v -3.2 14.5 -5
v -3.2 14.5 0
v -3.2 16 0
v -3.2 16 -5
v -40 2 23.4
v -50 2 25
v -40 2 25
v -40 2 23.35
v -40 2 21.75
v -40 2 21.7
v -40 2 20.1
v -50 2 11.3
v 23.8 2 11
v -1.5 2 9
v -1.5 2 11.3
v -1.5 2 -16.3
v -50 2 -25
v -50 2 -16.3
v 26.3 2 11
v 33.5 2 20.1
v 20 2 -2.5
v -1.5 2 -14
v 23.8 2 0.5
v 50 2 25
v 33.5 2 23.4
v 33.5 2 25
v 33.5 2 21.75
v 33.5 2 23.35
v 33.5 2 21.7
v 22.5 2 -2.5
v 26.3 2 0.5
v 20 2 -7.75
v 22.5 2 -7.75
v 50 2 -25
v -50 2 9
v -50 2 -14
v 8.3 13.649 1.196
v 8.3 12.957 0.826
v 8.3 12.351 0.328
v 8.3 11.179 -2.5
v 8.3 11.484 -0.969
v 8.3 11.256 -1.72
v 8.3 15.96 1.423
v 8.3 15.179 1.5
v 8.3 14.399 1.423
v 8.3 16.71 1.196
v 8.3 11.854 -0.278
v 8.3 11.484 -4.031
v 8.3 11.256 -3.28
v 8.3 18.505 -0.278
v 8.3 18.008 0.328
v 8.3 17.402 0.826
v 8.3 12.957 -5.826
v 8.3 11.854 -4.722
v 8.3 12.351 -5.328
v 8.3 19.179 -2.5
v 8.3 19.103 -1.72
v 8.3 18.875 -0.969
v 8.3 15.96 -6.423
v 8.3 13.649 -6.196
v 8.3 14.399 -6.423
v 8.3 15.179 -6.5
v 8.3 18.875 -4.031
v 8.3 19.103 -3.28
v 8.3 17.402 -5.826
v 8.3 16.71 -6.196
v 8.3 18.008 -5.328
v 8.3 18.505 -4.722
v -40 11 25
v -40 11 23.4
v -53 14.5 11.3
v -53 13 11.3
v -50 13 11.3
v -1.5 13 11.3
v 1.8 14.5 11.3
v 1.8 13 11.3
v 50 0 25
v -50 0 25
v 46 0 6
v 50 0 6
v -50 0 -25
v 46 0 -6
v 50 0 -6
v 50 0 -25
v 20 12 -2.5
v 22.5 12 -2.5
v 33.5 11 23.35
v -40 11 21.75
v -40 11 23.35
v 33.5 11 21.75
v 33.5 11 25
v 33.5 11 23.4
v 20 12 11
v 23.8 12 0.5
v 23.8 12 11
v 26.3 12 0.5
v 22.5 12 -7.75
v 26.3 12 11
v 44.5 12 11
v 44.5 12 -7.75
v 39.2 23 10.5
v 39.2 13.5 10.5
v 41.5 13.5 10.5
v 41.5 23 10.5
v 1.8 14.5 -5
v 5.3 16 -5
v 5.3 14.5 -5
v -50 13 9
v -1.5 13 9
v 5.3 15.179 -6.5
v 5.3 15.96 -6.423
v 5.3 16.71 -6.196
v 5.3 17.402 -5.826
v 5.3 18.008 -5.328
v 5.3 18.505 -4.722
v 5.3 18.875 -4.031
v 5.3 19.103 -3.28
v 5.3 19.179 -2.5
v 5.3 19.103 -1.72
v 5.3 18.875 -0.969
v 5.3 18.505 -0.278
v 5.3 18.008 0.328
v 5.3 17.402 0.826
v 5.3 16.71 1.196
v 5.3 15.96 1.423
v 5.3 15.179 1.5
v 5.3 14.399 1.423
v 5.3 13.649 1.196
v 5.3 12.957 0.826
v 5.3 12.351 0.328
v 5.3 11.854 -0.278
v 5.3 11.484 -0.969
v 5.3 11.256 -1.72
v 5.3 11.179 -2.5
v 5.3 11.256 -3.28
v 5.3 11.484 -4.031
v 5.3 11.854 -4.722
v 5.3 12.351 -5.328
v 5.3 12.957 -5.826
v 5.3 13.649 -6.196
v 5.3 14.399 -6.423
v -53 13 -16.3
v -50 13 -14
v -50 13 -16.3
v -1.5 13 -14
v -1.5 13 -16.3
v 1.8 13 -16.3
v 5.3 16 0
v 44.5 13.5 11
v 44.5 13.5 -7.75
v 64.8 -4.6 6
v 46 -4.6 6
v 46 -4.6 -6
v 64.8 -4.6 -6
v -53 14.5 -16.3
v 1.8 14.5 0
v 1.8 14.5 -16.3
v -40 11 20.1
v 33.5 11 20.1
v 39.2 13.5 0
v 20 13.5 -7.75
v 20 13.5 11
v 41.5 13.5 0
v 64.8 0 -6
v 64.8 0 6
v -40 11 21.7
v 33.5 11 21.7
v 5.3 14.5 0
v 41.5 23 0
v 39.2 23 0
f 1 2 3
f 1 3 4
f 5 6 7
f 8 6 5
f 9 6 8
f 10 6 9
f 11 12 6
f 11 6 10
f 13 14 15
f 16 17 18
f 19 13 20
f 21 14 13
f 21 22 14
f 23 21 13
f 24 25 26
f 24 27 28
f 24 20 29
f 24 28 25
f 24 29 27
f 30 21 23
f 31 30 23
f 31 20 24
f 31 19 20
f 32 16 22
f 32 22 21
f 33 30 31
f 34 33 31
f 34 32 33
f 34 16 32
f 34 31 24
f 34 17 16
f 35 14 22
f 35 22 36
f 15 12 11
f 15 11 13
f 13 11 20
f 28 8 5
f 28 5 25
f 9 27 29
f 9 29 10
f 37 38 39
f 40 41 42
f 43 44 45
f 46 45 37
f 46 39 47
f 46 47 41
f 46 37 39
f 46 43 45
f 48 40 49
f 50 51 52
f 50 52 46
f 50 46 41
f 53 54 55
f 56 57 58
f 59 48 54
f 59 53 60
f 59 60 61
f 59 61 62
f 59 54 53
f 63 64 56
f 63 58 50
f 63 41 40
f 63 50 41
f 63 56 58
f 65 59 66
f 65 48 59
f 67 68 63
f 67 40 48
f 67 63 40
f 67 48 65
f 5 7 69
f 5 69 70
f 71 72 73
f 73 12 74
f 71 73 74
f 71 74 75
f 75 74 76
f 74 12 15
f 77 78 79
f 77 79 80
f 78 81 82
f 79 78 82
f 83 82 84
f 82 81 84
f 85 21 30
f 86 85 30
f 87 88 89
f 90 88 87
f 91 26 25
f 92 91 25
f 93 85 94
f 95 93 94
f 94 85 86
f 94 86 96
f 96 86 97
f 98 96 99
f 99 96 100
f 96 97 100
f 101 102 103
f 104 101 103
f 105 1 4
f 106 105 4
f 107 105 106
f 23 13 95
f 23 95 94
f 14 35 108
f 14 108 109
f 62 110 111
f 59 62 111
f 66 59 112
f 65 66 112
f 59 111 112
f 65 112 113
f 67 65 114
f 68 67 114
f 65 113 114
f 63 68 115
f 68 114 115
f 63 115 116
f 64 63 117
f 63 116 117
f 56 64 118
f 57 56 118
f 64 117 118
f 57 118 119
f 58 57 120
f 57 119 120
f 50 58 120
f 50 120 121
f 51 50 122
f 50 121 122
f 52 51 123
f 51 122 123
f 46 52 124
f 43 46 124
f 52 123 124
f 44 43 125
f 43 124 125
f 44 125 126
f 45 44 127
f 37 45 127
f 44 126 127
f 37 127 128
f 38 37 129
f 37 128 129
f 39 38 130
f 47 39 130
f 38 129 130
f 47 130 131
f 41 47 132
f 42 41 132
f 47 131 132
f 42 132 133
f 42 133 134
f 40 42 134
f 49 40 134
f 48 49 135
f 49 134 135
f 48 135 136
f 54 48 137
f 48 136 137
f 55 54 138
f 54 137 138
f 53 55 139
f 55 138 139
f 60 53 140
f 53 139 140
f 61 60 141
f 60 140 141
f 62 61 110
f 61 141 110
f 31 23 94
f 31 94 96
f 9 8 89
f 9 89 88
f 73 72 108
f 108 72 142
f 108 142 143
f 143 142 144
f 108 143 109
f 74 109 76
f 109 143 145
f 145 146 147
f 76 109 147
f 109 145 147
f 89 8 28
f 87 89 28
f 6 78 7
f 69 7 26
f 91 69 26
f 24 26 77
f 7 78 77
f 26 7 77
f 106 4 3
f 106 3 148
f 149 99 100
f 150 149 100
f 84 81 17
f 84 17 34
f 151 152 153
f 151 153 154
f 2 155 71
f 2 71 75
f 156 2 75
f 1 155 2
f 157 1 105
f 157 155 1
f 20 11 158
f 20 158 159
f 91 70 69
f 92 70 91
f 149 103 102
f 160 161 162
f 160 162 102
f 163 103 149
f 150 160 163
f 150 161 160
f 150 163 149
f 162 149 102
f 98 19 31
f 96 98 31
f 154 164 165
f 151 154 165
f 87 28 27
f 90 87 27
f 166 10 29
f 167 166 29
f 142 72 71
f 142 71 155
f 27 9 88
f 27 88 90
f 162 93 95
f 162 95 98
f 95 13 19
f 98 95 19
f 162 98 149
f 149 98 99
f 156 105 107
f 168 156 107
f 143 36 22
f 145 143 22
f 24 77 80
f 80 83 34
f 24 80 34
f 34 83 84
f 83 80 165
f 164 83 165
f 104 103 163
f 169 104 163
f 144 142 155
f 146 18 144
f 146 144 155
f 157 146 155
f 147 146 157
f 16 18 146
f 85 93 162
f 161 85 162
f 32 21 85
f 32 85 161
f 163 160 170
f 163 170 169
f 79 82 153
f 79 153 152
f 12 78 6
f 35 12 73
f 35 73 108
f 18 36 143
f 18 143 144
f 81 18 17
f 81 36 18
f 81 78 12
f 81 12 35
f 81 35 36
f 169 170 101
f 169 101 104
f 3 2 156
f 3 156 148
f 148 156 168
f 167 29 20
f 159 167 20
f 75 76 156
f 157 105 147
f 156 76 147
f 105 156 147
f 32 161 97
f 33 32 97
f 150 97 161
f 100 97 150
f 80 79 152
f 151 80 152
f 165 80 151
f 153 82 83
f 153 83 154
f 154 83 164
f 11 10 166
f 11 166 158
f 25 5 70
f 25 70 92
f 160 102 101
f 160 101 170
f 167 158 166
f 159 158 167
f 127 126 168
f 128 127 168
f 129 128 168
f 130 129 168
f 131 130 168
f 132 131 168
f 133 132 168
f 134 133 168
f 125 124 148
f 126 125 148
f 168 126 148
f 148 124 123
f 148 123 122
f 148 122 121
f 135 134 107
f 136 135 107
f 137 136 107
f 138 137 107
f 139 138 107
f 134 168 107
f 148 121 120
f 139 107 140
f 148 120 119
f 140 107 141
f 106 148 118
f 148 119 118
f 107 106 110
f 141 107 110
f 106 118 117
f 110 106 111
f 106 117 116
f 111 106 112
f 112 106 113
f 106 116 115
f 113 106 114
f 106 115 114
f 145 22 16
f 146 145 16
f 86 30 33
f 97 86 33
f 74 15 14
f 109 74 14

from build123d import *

# Parameters (mm, degrees)
SKETCH1_W            = 100
SKETCH1_H            = 50
BOSS_EXTRUDE1_DEPTH  = 2
SKETCH2_W            = 73.5
SKETCH2_H            = 1.6
BOSS_EXTRUDE2_DEPTH  = 9
LPATTERN2_COUNT      = 3
LPATTERN2_PITCH      = 1.65
SKETCH3_W            = 18.8
SKETCH3_H            = 12
BOSS_EXTRUDE3_DEPTH  = 4.6
SKETCH4_W            = 48.5
SKETCH4_H            = 2.3
BOSS_EXTRUDE4_DEPTH  = 11
SKETCH5_W            = 54.8
SKETCH5_H            = 27.6
BOSS_EXTRUDE5_DEPTH  = 1.5
SKETCH6_W            = 8.5
SKETCH6_H            = 5
BOSS_EXTRUDE6_DEPTH  = 1.5
SKETCH7_R            = 4
BOSS_EXTRUDE7_DEPTH  = 3
SKETCH8_W            = 2.5
SKETCH8_H            = 10.5
SKETCH8_H_2          = 5.25
BOSS_EXTRUDE8_DEPTH  = 10
SKETCH9_W            = 24.5
SKETCH9_H            = 18.75
BOSS_EXTRUDE9_DEPTH  = 1.5
SKETCH10_W           = 2.3
SKETCH10_H           = 10.5
BOSS_EXTRUDE10_DEPTH = 9.5


with BuildPart() as part:
    # Sketch1 → Boss-Extrude1 (new body)
    with BuildSketch(Plane(origin=(0, 0, 0), x_dir=(1, 0, 0), z_dir=(0, 1, 0))):
        Rectangle(SKETCH1_W, SKETCH1_H)
    extrude(amount=BOSS_EXTRUDE1_DEPTH)

    # Sketch2 → Boss-Extrude2 (add)
    with BuildSketch(Plane(origin=(0, 2, 0), x_dir=(1, 0, 0), z_dir=(0, 1, 0))):
        with Locations((-3.25, -24.2)):
            Rectangle(SKETCH2_W, SKETCH2_H)
    boss_extrude2 = extrude(amount=BOSS_EXTRUDE2_DEPTH)

    # LPattern2: Boss-Extrude2 ×3
    with Locations(*[(0, 0, -i * LPATTERN2_PITCH) for i in range(1, LPATTERN2_COUNT)]):
        add(boss_extrude2)

    # Sketch3 → Boss-Extrude3 (add)
    with BuildSketch(Plane.XZ):
        with Locations((55.4, 0)):
            Rectangle(SKETCH3_W, SKETCH3_H)
    extrude(amount=BOSS_EXTRUDE3_DEPTH)

    # Sketch4 → Boss-Extrude4 (add)
    with BuildSketch(Plane(origin=(0, 2, 0), x_dir=(1, 0, 0), z_dir=(0, 1, 0))):
        with Locations((-25.75, -10.15)):
            Rectangle(SKETCH4_W, SKETCH4_H)
        with Locations((-25.75, 15.15)):
            Rectangle(SKETCH4_W, SKETCH4_H)
    extrude(amount=BOSS_EXTRUDE4_DEPTH)

    # Sketch5 → Boss-Extrude5 (add)
    with BuildSketch(Plane(origin=(0, 13, 0), x_dir=(1, 0, 0), z_dir=(0, 1, 0))):
        with Locations((-25.6, 2.5)):
            Rectangle(SKETCH5_W, SKETCH5_H)
    extrude(amount=BOSS_EXTRUDE5_DEPTH)

    # Sketch6 → Boss-Extrude6 (add)
    with BuildSketch(Plane(origin=(0, 14.5, 0), x_dir=(1, 0, 0), z_dir=(0, 1, 0))):
        with Locations((1.05, 2.5)):
            Rectangle(SKETCH6_W, SKETCH6_H)
    extrude(amount=BOSS_EXTRUDE6_DEPTH)

    # Sketch7 → Boss-Extrude7 (add)
    with BuildSketch(Plane(origin=(5.3, 0, 0), x_dir=(0, 0, -1), z_dir=(1, 0, 0))):
        with Locations((2.5, 15.179402112)):
            Circle(SKETCH7_R)
    extrude(amount=BOSS_EXTRUDE7_DEPTH)

    # Sketch8 → Boss-Extrude8 (add)
    with BuildSketch(Plane(origin=(0, 2, 0), x_dir=(1, 0, 0), z_dir=(0, 1, 0))):
        with Locations((25.05, -5.75)):
            Rectangle(SKETCH8_W, SKETCH8_H)
        with Locations((21.25, 5.125)):
            Rectangle(SKETCH8_W, SKETCH8_H_2)
    extrude(amount=BOSS_EXTRUDE8_DEPTH)

    # Sketch9 → Boss-Extrude9 (add)
    with BuildSketch(Plane(origin=(0, 12, 0), x_dir=(1, 0, 0), z_dir=(0, 1, 0))):
        with Locations((32.25, -1.625)):
            Rectangle(SKETCH9_W, SKETCH9_H)
    extrude(amount=BOSS_EXTRUDE9_DEPTH)

    # Sketch10 → Boss-Extrude10 (add)
    with BuildSketch(Plane(origin=(0, 13.5, 0), x_dir=(1, 0, 0), z_dir=(0, 1, 0))):
        with Locations((40.35, -5.25)):
            Rectangle(SKETCH10_W, SKETCH10_H)
    extrude(amount=BOSS_EXTRUDE10_DEPTH)


solid = part.part
